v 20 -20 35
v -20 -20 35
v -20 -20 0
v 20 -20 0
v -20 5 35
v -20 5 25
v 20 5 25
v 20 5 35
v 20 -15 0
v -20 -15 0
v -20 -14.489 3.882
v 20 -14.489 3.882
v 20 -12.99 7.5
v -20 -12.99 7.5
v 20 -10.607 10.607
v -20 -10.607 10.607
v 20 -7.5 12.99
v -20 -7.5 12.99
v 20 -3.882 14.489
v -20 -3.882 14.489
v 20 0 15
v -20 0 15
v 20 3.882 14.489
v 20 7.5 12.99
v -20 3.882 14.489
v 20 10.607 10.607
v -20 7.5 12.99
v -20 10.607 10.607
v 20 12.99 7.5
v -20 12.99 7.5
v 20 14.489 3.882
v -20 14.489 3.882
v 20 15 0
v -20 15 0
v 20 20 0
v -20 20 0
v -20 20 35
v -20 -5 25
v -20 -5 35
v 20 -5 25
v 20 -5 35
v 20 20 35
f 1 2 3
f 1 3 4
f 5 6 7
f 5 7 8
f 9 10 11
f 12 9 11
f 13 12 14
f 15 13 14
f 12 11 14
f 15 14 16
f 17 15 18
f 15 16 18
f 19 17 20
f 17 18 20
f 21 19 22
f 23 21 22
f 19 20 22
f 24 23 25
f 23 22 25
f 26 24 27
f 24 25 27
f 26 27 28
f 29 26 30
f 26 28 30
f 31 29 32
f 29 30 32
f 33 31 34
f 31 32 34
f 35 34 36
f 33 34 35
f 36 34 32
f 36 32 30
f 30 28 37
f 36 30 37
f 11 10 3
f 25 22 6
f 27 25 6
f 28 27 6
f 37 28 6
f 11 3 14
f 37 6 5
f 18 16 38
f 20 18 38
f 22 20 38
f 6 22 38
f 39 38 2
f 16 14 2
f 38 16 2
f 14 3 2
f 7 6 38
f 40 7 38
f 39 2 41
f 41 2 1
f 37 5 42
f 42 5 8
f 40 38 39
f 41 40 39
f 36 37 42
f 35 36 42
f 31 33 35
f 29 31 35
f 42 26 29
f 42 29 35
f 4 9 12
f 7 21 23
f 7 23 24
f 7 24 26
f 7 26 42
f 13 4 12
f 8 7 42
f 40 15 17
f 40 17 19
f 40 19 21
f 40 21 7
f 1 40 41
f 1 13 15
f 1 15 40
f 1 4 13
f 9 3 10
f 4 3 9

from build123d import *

# Parameters (mm, degrees)
F0_W     = 40
F0_H     = 35
F1_DEPTH = 20
F3_DEPTH = 100
F2_W     = 10
F2_H     = 10
F4_DEPTH = 40.001


with BuildPart() as f1:
    # F0 (on Front) → F1 (new body, symmetric)
    with BuildSketch(Plane.XZ):
        with Locations((0, 17.5)):
            Rectangle(F0_W, F0_H)
    extrude(amount=F1_DEPTH, both=True)

    # F2 (on face) → F3 (cut, symmetric)
    with BuildSketch(Plane(origin=(-20, 0, 0), x_dir=(0, -1, 0), z_dir=(-1, 0, 0))):
        with BuildLine():
            Line((-15, 0), (15, 0))
            ThreePointArc((15, 0), (0, 15), (-15, 0))
        make_face()
    extrude(amount=F3_DEPTH, both=True, mode=Mode.SUBTRACT)

    # F2 (on face) → F4 (cut, through all)
    with BuildSketch(Plane(origin=(-20, 0, 0), x_dir=(0, -1, 0), z_dir=(-1, 0, 0))):
        with Locations((0, 30)):
            Rectangle(F2_W, F2_H)
    extrude(amount=-F4_DEPTH, mode=Mode.SUBTRACT)


solid = f1.part
